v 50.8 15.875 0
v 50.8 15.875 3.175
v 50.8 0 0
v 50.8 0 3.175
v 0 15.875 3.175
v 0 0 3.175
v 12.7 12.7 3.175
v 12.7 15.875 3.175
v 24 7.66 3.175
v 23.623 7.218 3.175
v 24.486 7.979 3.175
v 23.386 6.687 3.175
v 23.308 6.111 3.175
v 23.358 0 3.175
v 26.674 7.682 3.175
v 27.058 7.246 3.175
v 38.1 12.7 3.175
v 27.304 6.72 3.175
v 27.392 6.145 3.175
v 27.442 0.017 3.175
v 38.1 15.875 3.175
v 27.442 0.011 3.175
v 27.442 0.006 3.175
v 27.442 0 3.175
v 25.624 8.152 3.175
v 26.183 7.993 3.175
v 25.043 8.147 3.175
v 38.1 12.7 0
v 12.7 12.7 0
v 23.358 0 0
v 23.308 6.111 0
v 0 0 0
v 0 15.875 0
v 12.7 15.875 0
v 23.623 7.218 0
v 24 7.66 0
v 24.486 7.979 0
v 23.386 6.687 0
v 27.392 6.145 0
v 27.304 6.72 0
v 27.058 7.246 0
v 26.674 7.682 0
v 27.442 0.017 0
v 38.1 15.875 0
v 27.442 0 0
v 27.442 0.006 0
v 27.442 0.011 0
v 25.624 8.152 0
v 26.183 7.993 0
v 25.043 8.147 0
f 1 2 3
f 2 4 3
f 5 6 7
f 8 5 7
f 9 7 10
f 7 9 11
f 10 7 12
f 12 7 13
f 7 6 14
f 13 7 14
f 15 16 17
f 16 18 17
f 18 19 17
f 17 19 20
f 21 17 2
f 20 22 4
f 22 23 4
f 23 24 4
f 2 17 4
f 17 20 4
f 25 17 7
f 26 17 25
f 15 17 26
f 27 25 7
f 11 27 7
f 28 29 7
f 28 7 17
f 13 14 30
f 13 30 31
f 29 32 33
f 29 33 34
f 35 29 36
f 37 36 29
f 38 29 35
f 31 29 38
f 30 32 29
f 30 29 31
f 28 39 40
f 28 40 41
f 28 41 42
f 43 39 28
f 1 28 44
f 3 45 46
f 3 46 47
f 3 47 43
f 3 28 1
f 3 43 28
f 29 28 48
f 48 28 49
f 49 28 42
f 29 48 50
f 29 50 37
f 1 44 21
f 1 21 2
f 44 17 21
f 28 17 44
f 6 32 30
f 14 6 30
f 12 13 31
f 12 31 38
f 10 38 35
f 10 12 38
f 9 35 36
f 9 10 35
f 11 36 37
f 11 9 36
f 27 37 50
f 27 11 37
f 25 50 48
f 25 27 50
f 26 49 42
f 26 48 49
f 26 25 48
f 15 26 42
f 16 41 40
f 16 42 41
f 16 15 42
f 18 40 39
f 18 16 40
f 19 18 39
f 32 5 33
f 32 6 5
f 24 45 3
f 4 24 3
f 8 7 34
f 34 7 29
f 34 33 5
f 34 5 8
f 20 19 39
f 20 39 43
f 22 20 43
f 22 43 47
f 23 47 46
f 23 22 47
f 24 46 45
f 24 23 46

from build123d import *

# Parameters (mm, degrees)
SKETCH1_W       = 50.8
SKETCH1_H       = 12.7
EXTRUDE1_DEPTH  = 3.175
SKETCH3_W       = 12.7
SKETCH3_H       = 3.175
EXTRUDE3_DEPTH  = 3.175
LPATTERN1_COUNT = 2
LPATTERN1_PITCH = 38.1
EXTRUDE4_DEPTH  = 4.175


with BuildPart() as part:
    # Sketch1 → Extrude1 (new body)
    with BuildSketch(Plane.XY):
        with Locations((25.4, 6.35)):
            Rectangle(SKETCH1_W, SKETCH1_H)
    extrude(amount=EXTRUDE1_DEPTH)

    # Sketch3 → Extrude3 (add)
    with BuildSketch(Plane(origin=(0, 12.7, 0), x_dir=(1, 0, 0), z_dir=(0, 1, 0))):
        with Locations((6.35, -1.5875)):
            Rectangle(SKETCH3_W, SKETCH3_H)
    extrude3 = extrude(amount=EXTRUDE3_DEPTH)

    # LPattern1: Extrude3 ×2
    with Locations(*[(i * LPATTERN1_PITCH, 0, 0) for i in range(1, LPATTERN1_COUNT)]):
        add(extrude3)

    # Sketch4 → Extrude4 (cut, through all)
    with BuildSketch(Plane.XY.offset(3.175)):
        with BuildLine():
            Line((27.391652548, 6.144928853), (27.441911715, 0.016746365))
            ThreePointArc((27.441911715, 0.016746365), (25.416746365, -2.041911715), (23.358088285, -0.016746365))
            Line((23.358088285, -0.016746365), (23.307829118, 6.111436122))
            ThreePointArc((23.307829118, 6.111436122), (25.332994468, 8.170094203), (27.391652548, 6.144928853))
        make_face()
    extrude(amount=-EXTRUDE4_DEPTH, mode=Mode.SUBTRACT)


solid = part.part
